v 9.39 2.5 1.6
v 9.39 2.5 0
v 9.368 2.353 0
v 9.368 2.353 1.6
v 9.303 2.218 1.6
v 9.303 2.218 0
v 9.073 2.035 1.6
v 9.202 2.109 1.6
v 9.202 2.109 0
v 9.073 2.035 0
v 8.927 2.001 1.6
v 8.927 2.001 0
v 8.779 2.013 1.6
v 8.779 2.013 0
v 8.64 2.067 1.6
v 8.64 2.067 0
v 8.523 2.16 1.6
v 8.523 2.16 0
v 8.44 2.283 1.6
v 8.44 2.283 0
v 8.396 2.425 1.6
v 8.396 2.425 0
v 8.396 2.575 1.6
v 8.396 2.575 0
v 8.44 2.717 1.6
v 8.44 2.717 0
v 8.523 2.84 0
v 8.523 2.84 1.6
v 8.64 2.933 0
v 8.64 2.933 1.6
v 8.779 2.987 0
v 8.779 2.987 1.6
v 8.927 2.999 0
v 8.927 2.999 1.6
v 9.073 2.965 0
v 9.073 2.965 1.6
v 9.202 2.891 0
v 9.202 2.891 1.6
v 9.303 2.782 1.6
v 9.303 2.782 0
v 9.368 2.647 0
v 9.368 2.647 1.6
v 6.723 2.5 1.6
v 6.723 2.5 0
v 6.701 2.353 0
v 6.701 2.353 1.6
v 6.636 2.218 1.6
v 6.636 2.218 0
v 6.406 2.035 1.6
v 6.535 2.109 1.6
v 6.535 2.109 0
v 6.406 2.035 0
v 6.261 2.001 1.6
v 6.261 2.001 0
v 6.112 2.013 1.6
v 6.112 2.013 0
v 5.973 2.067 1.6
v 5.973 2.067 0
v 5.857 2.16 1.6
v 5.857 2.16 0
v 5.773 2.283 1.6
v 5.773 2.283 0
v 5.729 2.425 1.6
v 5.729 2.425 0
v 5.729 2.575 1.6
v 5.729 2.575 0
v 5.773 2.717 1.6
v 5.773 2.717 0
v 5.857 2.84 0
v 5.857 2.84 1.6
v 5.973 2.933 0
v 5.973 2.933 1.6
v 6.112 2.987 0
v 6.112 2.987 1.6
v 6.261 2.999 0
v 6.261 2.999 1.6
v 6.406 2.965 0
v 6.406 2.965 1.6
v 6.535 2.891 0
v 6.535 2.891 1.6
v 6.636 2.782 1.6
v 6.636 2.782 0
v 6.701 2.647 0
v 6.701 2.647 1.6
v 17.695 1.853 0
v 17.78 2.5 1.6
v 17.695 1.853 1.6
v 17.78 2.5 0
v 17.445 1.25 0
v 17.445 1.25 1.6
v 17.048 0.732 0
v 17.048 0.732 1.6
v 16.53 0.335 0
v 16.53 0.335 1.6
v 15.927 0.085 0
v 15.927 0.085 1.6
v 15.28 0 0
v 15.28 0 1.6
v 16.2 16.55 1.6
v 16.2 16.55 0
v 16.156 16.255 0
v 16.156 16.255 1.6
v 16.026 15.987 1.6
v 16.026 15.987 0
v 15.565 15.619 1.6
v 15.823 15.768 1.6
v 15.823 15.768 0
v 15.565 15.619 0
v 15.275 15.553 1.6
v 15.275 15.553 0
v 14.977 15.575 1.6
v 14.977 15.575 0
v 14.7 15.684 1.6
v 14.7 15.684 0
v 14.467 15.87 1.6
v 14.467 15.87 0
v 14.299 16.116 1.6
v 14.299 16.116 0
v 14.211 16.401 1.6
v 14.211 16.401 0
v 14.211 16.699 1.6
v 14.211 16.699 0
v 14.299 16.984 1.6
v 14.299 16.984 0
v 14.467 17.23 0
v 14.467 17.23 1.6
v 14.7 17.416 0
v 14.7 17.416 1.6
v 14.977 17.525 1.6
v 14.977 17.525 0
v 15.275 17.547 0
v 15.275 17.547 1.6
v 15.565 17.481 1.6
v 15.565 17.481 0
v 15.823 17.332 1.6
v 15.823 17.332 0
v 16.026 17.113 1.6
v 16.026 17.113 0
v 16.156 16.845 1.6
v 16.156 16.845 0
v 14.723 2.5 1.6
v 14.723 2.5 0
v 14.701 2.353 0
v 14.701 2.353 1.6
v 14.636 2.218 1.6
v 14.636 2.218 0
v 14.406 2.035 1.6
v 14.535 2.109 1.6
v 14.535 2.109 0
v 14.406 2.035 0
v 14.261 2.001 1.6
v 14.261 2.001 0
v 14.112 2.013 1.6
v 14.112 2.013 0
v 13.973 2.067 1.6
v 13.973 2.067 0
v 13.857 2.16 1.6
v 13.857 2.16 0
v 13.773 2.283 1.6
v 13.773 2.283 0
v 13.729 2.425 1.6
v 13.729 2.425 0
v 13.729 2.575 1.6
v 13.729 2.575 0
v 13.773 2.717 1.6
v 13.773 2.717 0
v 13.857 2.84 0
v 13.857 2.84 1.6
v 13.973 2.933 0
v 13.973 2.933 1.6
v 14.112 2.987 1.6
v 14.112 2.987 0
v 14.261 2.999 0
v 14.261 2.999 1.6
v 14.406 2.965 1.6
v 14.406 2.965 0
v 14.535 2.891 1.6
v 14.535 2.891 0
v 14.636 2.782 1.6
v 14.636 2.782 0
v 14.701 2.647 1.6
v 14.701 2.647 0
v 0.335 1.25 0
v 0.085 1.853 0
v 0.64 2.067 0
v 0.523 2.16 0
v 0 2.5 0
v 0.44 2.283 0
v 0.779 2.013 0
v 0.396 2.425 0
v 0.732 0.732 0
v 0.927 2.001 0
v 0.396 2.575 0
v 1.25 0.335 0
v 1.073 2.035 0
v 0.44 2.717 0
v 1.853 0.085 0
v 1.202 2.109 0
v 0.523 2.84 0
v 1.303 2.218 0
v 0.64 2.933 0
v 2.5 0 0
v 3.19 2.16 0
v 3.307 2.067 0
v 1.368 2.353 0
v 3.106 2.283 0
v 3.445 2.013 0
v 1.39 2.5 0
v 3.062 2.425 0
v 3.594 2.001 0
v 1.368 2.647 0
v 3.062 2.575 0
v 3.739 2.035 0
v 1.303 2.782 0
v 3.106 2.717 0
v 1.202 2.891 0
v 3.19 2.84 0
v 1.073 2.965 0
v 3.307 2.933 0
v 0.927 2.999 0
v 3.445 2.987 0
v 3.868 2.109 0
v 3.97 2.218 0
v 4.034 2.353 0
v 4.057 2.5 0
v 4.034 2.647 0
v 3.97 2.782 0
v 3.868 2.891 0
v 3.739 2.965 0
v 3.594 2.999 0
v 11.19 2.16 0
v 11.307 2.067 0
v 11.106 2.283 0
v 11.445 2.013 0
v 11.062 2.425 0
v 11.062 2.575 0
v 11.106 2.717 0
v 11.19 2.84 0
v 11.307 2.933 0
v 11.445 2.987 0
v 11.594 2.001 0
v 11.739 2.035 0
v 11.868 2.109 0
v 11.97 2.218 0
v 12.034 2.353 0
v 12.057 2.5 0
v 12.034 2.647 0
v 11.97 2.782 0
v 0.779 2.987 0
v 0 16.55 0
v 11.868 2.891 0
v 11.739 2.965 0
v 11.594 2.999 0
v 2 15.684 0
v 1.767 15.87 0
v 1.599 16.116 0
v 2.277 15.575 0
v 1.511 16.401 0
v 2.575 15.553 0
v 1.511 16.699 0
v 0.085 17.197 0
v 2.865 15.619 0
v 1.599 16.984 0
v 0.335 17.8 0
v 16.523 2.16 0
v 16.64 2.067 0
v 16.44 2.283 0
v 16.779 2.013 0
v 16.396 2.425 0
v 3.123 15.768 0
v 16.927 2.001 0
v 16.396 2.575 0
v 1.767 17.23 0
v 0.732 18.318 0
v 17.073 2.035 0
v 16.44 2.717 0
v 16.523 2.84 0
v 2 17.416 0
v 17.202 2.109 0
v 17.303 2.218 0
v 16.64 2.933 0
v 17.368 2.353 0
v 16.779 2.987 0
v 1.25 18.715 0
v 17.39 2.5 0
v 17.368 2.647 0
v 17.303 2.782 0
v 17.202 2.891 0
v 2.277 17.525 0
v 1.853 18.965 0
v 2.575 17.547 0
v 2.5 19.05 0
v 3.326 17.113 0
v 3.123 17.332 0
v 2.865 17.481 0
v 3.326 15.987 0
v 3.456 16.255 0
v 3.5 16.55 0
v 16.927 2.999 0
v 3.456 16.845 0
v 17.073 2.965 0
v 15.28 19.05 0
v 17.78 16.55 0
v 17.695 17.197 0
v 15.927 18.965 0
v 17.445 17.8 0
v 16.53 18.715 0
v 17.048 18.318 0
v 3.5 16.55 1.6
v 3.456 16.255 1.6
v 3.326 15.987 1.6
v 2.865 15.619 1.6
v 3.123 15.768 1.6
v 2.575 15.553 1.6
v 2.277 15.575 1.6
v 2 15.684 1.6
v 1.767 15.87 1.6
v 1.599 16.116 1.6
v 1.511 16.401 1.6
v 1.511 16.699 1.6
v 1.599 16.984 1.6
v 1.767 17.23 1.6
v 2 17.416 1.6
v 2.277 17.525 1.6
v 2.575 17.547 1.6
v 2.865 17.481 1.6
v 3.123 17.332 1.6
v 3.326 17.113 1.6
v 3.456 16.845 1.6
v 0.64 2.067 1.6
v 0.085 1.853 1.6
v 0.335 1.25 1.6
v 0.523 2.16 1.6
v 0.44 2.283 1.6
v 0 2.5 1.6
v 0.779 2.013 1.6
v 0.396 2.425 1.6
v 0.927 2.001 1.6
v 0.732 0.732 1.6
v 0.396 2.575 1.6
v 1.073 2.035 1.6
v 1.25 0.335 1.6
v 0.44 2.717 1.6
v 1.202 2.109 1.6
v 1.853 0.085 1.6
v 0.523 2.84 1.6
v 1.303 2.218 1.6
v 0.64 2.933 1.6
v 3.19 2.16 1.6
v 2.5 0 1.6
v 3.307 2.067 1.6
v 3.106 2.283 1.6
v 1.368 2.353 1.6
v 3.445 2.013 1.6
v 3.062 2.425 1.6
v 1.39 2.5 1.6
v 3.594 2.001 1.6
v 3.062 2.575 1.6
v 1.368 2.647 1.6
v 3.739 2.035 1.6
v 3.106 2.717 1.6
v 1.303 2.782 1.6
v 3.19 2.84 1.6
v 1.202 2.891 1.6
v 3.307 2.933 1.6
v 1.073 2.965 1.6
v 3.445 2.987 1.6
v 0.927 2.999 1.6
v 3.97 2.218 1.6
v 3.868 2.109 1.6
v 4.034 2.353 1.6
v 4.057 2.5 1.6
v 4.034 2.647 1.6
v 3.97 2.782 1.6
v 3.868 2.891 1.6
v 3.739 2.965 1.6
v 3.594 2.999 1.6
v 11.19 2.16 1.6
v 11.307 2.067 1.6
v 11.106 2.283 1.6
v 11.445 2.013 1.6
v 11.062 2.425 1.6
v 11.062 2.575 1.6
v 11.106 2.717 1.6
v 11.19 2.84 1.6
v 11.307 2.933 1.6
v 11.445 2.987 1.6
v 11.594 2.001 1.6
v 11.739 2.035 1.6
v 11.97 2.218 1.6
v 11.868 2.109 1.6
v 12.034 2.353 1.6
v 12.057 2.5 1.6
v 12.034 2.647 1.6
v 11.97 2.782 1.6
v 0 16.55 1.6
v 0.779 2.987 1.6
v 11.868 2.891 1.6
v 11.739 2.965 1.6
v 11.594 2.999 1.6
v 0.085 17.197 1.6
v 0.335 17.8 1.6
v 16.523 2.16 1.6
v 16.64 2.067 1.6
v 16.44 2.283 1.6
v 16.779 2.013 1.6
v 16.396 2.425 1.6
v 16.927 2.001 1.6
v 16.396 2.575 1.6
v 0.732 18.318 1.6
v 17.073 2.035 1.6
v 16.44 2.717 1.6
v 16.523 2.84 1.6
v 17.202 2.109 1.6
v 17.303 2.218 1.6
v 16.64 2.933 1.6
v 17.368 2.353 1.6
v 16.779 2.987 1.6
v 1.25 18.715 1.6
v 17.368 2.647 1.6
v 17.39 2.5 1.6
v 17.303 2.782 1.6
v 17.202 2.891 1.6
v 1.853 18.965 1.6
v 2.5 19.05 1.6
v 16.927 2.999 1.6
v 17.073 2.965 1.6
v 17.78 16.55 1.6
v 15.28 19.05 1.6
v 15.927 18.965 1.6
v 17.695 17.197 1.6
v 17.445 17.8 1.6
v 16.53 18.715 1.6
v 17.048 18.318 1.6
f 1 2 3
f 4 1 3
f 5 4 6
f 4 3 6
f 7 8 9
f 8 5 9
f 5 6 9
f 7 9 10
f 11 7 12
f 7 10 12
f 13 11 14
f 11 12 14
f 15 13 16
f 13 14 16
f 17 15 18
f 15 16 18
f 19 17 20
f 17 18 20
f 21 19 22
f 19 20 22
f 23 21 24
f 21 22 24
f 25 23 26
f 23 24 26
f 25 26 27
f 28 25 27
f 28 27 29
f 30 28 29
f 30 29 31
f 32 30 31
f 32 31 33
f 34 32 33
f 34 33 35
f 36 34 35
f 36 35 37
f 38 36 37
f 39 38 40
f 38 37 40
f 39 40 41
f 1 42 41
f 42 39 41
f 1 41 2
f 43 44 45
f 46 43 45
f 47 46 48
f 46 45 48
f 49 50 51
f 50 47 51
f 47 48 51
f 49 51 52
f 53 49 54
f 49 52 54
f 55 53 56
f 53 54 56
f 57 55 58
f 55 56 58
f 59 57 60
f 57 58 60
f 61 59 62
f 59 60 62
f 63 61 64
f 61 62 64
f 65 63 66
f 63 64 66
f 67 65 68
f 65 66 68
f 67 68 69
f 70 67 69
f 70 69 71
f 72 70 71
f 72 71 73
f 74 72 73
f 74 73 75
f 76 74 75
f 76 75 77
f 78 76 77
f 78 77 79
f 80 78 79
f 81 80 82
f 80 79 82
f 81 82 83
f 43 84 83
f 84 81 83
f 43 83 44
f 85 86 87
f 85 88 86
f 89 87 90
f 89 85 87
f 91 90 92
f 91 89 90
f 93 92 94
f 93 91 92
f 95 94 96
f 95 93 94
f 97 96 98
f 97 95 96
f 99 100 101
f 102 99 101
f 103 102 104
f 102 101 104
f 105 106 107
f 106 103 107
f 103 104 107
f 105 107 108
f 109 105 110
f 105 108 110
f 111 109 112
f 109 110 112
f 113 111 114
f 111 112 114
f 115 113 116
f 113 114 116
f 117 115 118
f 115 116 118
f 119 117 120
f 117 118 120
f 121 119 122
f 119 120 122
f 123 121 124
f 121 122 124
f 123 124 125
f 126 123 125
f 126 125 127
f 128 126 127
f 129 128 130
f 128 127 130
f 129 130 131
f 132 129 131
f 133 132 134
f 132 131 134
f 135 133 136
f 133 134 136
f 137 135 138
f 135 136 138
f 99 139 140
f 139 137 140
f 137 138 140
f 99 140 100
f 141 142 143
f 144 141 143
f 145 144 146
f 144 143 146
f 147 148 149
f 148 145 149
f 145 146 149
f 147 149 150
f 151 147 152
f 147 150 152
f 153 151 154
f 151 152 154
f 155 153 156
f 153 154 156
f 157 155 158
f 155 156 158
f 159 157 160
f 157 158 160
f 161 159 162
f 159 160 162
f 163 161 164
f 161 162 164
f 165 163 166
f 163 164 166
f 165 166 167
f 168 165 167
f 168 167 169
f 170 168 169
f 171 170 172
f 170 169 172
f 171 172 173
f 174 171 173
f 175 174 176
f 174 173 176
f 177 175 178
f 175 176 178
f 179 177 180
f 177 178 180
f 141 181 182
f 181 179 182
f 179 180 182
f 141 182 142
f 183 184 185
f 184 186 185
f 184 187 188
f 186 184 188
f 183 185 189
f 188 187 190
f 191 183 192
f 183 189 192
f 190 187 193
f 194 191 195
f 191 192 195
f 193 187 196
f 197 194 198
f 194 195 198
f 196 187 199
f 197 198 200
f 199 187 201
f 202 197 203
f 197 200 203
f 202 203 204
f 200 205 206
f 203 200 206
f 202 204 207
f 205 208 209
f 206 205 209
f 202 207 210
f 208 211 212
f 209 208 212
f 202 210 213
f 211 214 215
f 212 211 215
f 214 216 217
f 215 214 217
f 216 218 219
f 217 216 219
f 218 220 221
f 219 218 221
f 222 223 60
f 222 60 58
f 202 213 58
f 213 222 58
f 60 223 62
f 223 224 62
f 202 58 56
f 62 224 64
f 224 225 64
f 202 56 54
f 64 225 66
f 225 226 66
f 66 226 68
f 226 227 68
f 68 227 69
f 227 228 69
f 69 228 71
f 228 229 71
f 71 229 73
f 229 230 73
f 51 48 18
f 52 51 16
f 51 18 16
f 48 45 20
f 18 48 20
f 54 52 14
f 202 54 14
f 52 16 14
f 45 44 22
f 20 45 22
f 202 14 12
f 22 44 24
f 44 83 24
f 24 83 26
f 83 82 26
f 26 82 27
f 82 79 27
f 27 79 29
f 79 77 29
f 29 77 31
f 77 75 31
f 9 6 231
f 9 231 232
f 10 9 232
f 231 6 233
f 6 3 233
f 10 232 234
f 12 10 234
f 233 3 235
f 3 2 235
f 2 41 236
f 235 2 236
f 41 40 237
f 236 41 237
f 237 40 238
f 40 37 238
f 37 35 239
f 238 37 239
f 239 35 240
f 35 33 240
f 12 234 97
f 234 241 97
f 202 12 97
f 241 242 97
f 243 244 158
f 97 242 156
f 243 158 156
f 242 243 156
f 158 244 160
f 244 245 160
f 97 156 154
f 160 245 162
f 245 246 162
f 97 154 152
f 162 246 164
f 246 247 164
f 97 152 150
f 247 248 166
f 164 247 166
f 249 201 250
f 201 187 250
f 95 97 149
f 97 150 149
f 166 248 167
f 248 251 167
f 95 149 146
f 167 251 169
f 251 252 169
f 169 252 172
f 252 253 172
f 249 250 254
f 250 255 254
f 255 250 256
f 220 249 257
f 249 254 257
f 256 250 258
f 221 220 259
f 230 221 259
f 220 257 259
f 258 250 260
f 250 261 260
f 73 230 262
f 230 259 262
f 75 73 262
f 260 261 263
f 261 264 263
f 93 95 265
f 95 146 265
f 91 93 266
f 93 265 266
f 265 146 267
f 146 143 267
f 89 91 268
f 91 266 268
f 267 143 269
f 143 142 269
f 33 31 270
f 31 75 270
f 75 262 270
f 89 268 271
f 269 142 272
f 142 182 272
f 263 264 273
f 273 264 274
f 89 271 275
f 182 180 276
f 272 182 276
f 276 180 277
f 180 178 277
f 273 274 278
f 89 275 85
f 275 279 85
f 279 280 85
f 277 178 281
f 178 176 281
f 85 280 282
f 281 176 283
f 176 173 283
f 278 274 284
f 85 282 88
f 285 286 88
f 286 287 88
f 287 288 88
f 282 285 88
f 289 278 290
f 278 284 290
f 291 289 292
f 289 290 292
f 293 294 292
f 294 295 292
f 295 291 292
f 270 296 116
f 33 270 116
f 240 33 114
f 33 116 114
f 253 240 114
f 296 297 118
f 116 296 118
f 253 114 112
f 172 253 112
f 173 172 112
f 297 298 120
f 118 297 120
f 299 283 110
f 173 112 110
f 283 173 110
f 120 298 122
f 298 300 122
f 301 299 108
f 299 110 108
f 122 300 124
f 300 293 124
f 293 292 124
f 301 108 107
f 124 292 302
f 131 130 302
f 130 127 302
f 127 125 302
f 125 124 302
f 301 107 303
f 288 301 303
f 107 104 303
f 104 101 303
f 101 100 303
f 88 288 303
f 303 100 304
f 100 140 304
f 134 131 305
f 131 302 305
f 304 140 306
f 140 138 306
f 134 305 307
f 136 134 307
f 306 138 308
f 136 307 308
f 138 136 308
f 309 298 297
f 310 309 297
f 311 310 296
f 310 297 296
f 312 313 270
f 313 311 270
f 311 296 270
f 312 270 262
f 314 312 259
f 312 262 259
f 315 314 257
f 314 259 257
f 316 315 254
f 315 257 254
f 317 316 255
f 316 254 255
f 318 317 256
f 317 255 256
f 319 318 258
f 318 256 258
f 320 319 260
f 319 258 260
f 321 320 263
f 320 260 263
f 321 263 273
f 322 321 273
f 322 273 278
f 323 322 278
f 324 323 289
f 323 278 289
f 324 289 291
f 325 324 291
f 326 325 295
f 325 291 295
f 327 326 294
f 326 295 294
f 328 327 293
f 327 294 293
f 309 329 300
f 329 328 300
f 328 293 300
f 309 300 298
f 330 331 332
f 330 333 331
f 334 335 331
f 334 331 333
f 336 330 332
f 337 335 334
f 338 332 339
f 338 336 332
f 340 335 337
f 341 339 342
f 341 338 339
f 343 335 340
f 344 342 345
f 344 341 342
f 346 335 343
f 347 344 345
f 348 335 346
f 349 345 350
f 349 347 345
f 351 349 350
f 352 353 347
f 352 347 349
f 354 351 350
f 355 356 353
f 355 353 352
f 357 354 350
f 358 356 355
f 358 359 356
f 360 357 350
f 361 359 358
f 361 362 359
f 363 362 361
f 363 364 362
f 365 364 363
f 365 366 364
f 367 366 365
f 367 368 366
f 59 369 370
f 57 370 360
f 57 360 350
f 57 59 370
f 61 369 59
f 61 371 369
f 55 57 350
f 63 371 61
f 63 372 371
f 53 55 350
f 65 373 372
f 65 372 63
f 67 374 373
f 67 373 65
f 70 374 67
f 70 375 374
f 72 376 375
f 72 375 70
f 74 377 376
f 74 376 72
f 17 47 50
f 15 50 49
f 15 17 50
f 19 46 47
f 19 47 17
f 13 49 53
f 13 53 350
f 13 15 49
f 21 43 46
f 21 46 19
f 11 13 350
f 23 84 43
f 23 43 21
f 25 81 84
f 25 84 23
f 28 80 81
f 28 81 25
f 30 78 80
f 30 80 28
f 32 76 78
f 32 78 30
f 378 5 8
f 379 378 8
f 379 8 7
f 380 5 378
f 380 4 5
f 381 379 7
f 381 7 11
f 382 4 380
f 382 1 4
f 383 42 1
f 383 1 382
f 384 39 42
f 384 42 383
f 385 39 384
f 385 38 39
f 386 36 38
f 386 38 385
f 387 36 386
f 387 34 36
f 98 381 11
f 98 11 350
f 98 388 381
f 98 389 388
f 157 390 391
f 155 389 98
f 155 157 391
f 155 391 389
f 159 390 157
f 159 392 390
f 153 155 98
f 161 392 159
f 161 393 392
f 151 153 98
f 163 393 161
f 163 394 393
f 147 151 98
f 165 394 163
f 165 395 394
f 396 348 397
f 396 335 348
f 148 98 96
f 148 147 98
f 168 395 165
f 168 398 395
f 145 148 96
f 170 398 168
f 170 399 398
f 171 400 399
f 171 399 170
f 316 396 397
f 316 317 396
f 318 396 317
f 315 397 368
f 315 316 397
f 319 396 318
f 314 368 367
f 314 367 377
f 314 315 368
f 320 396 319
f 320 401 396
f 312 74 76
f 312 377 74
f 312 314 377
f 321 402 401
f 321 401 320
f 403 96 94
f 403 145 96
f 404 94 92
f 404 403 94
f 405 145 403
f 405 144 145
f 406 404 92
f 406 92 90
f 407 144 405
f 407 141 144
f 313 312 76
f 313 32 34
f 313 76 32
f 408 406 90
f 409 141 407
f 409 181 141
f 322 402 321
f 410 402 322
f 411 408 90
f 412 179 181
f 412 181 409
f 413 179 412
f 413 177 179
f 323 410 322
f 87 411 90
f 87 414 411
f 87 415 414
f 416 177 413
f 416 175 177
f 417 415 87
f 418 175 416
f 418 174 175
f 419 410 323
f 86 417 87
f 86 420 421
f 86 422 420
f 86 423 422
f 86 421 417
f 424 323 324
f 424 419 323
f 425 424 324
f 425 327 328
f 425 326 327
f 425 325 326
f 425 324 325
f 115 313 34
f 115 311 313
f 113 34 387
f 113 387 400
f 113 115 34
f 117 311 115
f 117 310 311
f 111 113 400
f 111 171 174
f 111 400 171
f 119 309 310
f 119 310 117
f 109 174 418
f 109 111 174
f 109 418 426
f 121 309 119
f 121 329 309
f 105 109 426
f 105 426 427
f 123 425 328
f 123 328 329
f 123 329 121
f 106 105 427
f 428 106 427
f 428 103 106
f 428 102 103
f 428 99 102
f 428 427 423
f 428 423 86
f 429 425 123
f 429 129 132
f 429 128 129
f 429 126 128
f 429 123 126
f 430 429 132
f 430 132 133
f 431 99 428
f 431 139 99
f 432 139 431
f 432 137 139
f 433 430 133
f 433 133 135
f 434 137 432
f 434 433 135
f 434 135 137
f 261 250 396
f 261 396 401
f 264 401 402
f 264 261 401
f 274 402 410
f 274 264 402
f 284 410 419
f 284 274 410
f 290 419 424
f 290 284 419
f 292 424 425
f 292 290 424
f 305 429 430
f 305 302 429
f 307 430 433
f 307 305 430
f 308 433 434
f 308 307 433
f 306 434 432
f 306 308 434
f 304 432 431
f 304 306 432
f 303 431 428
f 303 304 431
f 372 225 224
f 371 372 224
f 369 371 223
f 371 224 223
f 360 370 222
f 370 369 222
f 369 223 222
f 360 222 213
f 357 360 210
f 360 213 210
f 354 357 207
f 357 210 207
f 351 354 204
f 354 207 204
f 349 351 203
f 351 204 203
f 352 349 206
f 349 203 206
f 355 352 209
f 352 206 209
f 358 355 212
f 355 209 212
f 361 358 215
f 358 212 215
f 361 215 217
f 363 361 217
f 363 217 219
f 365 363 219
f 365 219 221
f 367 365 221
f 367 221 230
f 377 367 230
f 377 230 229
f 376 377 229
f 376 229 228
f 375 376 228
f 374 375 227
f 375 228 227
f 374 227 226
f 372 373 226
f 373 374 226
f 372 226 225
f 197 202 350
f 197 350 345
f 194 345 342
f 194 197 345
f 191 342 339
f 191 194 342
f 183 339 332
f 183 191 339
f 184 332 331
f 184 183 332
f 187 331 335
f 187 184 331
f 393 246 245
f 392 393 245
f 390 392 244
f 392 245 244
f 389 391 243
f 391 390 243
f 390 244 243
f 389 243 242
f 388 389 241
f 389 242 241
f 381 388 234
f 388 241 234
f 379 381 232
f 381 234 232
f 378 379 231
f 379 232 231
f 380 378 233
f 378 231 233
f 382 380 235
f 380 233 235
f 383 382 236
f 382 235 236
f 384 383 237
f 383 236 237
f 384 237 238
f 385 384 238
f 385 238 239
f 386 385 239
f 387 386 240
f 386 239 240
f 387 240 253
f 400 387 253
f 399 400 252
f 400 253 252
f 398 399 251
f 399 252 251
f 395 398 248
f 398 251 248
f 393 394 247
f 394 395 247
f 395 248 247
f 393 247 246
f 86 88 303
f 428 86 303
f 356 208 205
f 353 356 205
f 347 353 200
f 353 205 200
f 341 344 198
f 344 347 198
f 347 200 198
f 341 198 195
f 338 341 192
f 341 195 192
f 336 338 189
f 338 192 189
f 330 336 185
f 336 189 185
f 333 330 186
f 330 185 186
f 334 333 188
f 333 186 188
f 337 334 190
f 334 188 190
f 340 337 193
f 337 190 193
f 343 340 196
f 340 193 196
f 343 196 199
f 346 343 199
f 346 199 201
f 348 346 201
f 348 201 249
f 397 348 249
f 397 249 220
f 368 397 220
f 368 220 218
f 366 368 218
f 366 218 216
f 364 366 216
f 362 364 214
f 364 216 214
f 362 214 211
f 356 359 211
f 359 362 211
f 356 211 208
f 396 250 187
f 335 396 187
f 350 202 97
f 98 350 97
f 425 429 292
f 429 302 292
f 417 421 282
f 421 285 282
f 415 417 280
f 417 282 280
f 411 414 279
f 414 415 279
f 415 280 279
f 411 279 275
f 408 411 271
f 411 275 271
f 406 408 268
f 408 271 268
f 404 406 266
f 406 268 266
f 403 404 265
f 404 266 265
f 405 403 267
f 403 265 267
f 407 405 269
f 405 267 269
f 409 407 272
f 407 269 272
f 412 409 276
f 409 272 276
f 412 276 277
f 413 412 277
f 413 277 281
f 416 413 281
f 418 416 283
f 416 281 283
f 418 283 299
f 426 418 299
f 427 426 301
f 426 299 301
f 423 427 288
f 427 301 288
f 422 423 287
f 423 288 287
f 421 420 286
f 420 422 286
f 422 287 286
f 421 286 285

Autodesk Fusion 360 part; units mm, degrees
sketch "Skizze1" plane through (0, 0, 0) normal (0, 0, 1) x (1, 0, 0)
  line L0 (2.5, 0) -> (15.28, 0)
  line L1 (17.78, 2.5) -> (17.78, 16.55)
  line L2 (15.28, 19.05) -> (2.5, 19.05)
  line L3 (0, 16.55) -> (0, 2.5)
  arc A0 (2.5, 19.05) -> (0, 16.55) centre (2.5, 16.55) ccw
  arc A1 (17.78, 16.55) -> (15.28, 19.05) centre (15.28, 16.55) ccw
  arc A2 (15.28, 0) -> (17.78, 2.5) centre (15.28, 2.5) ccw
  arc A3 (0, 2.5) -> (2.5, 0) centre (2.5, 2.5) ccw
  circle A4 centre (2.5, 16.55) radius 1
  circle A5 centre (15.2, 16.55) radius 1
  circle A6 centre (0.89, 2.5) radius 0.5
  circle A7 centre (3.5567, 2.5) radius 0.5
  circle A8 centre (6.2233, 2.5) radius 0.5
  circle A9 centre (8.89, 2.5) radius 0.5
  circle A10 centre (11.5567, 2.5) radius 0.5
  circle A11 centre (14.2233, 2.5) radius 0.5
  circle A12 centre (16.89, 2.5) radius 0.5
  point P0 (17.78, 0)
  dimension "d3" = 17.78
  dimension "d4" = 19.05
  dimension "d5" = 2.5
  dimension "d6" = 2
  dimension "d9" = 12.7
  dimension "d10" = 0
  dimension "d11" = 1
  dimension "d12" = 2.5
  dimension "d15" = 16
  dimension "d16" = 0
  dimension "d17" = 8.89
extrude "Extrusion1" add sketch "Skizze1" along normal blind 1.6
